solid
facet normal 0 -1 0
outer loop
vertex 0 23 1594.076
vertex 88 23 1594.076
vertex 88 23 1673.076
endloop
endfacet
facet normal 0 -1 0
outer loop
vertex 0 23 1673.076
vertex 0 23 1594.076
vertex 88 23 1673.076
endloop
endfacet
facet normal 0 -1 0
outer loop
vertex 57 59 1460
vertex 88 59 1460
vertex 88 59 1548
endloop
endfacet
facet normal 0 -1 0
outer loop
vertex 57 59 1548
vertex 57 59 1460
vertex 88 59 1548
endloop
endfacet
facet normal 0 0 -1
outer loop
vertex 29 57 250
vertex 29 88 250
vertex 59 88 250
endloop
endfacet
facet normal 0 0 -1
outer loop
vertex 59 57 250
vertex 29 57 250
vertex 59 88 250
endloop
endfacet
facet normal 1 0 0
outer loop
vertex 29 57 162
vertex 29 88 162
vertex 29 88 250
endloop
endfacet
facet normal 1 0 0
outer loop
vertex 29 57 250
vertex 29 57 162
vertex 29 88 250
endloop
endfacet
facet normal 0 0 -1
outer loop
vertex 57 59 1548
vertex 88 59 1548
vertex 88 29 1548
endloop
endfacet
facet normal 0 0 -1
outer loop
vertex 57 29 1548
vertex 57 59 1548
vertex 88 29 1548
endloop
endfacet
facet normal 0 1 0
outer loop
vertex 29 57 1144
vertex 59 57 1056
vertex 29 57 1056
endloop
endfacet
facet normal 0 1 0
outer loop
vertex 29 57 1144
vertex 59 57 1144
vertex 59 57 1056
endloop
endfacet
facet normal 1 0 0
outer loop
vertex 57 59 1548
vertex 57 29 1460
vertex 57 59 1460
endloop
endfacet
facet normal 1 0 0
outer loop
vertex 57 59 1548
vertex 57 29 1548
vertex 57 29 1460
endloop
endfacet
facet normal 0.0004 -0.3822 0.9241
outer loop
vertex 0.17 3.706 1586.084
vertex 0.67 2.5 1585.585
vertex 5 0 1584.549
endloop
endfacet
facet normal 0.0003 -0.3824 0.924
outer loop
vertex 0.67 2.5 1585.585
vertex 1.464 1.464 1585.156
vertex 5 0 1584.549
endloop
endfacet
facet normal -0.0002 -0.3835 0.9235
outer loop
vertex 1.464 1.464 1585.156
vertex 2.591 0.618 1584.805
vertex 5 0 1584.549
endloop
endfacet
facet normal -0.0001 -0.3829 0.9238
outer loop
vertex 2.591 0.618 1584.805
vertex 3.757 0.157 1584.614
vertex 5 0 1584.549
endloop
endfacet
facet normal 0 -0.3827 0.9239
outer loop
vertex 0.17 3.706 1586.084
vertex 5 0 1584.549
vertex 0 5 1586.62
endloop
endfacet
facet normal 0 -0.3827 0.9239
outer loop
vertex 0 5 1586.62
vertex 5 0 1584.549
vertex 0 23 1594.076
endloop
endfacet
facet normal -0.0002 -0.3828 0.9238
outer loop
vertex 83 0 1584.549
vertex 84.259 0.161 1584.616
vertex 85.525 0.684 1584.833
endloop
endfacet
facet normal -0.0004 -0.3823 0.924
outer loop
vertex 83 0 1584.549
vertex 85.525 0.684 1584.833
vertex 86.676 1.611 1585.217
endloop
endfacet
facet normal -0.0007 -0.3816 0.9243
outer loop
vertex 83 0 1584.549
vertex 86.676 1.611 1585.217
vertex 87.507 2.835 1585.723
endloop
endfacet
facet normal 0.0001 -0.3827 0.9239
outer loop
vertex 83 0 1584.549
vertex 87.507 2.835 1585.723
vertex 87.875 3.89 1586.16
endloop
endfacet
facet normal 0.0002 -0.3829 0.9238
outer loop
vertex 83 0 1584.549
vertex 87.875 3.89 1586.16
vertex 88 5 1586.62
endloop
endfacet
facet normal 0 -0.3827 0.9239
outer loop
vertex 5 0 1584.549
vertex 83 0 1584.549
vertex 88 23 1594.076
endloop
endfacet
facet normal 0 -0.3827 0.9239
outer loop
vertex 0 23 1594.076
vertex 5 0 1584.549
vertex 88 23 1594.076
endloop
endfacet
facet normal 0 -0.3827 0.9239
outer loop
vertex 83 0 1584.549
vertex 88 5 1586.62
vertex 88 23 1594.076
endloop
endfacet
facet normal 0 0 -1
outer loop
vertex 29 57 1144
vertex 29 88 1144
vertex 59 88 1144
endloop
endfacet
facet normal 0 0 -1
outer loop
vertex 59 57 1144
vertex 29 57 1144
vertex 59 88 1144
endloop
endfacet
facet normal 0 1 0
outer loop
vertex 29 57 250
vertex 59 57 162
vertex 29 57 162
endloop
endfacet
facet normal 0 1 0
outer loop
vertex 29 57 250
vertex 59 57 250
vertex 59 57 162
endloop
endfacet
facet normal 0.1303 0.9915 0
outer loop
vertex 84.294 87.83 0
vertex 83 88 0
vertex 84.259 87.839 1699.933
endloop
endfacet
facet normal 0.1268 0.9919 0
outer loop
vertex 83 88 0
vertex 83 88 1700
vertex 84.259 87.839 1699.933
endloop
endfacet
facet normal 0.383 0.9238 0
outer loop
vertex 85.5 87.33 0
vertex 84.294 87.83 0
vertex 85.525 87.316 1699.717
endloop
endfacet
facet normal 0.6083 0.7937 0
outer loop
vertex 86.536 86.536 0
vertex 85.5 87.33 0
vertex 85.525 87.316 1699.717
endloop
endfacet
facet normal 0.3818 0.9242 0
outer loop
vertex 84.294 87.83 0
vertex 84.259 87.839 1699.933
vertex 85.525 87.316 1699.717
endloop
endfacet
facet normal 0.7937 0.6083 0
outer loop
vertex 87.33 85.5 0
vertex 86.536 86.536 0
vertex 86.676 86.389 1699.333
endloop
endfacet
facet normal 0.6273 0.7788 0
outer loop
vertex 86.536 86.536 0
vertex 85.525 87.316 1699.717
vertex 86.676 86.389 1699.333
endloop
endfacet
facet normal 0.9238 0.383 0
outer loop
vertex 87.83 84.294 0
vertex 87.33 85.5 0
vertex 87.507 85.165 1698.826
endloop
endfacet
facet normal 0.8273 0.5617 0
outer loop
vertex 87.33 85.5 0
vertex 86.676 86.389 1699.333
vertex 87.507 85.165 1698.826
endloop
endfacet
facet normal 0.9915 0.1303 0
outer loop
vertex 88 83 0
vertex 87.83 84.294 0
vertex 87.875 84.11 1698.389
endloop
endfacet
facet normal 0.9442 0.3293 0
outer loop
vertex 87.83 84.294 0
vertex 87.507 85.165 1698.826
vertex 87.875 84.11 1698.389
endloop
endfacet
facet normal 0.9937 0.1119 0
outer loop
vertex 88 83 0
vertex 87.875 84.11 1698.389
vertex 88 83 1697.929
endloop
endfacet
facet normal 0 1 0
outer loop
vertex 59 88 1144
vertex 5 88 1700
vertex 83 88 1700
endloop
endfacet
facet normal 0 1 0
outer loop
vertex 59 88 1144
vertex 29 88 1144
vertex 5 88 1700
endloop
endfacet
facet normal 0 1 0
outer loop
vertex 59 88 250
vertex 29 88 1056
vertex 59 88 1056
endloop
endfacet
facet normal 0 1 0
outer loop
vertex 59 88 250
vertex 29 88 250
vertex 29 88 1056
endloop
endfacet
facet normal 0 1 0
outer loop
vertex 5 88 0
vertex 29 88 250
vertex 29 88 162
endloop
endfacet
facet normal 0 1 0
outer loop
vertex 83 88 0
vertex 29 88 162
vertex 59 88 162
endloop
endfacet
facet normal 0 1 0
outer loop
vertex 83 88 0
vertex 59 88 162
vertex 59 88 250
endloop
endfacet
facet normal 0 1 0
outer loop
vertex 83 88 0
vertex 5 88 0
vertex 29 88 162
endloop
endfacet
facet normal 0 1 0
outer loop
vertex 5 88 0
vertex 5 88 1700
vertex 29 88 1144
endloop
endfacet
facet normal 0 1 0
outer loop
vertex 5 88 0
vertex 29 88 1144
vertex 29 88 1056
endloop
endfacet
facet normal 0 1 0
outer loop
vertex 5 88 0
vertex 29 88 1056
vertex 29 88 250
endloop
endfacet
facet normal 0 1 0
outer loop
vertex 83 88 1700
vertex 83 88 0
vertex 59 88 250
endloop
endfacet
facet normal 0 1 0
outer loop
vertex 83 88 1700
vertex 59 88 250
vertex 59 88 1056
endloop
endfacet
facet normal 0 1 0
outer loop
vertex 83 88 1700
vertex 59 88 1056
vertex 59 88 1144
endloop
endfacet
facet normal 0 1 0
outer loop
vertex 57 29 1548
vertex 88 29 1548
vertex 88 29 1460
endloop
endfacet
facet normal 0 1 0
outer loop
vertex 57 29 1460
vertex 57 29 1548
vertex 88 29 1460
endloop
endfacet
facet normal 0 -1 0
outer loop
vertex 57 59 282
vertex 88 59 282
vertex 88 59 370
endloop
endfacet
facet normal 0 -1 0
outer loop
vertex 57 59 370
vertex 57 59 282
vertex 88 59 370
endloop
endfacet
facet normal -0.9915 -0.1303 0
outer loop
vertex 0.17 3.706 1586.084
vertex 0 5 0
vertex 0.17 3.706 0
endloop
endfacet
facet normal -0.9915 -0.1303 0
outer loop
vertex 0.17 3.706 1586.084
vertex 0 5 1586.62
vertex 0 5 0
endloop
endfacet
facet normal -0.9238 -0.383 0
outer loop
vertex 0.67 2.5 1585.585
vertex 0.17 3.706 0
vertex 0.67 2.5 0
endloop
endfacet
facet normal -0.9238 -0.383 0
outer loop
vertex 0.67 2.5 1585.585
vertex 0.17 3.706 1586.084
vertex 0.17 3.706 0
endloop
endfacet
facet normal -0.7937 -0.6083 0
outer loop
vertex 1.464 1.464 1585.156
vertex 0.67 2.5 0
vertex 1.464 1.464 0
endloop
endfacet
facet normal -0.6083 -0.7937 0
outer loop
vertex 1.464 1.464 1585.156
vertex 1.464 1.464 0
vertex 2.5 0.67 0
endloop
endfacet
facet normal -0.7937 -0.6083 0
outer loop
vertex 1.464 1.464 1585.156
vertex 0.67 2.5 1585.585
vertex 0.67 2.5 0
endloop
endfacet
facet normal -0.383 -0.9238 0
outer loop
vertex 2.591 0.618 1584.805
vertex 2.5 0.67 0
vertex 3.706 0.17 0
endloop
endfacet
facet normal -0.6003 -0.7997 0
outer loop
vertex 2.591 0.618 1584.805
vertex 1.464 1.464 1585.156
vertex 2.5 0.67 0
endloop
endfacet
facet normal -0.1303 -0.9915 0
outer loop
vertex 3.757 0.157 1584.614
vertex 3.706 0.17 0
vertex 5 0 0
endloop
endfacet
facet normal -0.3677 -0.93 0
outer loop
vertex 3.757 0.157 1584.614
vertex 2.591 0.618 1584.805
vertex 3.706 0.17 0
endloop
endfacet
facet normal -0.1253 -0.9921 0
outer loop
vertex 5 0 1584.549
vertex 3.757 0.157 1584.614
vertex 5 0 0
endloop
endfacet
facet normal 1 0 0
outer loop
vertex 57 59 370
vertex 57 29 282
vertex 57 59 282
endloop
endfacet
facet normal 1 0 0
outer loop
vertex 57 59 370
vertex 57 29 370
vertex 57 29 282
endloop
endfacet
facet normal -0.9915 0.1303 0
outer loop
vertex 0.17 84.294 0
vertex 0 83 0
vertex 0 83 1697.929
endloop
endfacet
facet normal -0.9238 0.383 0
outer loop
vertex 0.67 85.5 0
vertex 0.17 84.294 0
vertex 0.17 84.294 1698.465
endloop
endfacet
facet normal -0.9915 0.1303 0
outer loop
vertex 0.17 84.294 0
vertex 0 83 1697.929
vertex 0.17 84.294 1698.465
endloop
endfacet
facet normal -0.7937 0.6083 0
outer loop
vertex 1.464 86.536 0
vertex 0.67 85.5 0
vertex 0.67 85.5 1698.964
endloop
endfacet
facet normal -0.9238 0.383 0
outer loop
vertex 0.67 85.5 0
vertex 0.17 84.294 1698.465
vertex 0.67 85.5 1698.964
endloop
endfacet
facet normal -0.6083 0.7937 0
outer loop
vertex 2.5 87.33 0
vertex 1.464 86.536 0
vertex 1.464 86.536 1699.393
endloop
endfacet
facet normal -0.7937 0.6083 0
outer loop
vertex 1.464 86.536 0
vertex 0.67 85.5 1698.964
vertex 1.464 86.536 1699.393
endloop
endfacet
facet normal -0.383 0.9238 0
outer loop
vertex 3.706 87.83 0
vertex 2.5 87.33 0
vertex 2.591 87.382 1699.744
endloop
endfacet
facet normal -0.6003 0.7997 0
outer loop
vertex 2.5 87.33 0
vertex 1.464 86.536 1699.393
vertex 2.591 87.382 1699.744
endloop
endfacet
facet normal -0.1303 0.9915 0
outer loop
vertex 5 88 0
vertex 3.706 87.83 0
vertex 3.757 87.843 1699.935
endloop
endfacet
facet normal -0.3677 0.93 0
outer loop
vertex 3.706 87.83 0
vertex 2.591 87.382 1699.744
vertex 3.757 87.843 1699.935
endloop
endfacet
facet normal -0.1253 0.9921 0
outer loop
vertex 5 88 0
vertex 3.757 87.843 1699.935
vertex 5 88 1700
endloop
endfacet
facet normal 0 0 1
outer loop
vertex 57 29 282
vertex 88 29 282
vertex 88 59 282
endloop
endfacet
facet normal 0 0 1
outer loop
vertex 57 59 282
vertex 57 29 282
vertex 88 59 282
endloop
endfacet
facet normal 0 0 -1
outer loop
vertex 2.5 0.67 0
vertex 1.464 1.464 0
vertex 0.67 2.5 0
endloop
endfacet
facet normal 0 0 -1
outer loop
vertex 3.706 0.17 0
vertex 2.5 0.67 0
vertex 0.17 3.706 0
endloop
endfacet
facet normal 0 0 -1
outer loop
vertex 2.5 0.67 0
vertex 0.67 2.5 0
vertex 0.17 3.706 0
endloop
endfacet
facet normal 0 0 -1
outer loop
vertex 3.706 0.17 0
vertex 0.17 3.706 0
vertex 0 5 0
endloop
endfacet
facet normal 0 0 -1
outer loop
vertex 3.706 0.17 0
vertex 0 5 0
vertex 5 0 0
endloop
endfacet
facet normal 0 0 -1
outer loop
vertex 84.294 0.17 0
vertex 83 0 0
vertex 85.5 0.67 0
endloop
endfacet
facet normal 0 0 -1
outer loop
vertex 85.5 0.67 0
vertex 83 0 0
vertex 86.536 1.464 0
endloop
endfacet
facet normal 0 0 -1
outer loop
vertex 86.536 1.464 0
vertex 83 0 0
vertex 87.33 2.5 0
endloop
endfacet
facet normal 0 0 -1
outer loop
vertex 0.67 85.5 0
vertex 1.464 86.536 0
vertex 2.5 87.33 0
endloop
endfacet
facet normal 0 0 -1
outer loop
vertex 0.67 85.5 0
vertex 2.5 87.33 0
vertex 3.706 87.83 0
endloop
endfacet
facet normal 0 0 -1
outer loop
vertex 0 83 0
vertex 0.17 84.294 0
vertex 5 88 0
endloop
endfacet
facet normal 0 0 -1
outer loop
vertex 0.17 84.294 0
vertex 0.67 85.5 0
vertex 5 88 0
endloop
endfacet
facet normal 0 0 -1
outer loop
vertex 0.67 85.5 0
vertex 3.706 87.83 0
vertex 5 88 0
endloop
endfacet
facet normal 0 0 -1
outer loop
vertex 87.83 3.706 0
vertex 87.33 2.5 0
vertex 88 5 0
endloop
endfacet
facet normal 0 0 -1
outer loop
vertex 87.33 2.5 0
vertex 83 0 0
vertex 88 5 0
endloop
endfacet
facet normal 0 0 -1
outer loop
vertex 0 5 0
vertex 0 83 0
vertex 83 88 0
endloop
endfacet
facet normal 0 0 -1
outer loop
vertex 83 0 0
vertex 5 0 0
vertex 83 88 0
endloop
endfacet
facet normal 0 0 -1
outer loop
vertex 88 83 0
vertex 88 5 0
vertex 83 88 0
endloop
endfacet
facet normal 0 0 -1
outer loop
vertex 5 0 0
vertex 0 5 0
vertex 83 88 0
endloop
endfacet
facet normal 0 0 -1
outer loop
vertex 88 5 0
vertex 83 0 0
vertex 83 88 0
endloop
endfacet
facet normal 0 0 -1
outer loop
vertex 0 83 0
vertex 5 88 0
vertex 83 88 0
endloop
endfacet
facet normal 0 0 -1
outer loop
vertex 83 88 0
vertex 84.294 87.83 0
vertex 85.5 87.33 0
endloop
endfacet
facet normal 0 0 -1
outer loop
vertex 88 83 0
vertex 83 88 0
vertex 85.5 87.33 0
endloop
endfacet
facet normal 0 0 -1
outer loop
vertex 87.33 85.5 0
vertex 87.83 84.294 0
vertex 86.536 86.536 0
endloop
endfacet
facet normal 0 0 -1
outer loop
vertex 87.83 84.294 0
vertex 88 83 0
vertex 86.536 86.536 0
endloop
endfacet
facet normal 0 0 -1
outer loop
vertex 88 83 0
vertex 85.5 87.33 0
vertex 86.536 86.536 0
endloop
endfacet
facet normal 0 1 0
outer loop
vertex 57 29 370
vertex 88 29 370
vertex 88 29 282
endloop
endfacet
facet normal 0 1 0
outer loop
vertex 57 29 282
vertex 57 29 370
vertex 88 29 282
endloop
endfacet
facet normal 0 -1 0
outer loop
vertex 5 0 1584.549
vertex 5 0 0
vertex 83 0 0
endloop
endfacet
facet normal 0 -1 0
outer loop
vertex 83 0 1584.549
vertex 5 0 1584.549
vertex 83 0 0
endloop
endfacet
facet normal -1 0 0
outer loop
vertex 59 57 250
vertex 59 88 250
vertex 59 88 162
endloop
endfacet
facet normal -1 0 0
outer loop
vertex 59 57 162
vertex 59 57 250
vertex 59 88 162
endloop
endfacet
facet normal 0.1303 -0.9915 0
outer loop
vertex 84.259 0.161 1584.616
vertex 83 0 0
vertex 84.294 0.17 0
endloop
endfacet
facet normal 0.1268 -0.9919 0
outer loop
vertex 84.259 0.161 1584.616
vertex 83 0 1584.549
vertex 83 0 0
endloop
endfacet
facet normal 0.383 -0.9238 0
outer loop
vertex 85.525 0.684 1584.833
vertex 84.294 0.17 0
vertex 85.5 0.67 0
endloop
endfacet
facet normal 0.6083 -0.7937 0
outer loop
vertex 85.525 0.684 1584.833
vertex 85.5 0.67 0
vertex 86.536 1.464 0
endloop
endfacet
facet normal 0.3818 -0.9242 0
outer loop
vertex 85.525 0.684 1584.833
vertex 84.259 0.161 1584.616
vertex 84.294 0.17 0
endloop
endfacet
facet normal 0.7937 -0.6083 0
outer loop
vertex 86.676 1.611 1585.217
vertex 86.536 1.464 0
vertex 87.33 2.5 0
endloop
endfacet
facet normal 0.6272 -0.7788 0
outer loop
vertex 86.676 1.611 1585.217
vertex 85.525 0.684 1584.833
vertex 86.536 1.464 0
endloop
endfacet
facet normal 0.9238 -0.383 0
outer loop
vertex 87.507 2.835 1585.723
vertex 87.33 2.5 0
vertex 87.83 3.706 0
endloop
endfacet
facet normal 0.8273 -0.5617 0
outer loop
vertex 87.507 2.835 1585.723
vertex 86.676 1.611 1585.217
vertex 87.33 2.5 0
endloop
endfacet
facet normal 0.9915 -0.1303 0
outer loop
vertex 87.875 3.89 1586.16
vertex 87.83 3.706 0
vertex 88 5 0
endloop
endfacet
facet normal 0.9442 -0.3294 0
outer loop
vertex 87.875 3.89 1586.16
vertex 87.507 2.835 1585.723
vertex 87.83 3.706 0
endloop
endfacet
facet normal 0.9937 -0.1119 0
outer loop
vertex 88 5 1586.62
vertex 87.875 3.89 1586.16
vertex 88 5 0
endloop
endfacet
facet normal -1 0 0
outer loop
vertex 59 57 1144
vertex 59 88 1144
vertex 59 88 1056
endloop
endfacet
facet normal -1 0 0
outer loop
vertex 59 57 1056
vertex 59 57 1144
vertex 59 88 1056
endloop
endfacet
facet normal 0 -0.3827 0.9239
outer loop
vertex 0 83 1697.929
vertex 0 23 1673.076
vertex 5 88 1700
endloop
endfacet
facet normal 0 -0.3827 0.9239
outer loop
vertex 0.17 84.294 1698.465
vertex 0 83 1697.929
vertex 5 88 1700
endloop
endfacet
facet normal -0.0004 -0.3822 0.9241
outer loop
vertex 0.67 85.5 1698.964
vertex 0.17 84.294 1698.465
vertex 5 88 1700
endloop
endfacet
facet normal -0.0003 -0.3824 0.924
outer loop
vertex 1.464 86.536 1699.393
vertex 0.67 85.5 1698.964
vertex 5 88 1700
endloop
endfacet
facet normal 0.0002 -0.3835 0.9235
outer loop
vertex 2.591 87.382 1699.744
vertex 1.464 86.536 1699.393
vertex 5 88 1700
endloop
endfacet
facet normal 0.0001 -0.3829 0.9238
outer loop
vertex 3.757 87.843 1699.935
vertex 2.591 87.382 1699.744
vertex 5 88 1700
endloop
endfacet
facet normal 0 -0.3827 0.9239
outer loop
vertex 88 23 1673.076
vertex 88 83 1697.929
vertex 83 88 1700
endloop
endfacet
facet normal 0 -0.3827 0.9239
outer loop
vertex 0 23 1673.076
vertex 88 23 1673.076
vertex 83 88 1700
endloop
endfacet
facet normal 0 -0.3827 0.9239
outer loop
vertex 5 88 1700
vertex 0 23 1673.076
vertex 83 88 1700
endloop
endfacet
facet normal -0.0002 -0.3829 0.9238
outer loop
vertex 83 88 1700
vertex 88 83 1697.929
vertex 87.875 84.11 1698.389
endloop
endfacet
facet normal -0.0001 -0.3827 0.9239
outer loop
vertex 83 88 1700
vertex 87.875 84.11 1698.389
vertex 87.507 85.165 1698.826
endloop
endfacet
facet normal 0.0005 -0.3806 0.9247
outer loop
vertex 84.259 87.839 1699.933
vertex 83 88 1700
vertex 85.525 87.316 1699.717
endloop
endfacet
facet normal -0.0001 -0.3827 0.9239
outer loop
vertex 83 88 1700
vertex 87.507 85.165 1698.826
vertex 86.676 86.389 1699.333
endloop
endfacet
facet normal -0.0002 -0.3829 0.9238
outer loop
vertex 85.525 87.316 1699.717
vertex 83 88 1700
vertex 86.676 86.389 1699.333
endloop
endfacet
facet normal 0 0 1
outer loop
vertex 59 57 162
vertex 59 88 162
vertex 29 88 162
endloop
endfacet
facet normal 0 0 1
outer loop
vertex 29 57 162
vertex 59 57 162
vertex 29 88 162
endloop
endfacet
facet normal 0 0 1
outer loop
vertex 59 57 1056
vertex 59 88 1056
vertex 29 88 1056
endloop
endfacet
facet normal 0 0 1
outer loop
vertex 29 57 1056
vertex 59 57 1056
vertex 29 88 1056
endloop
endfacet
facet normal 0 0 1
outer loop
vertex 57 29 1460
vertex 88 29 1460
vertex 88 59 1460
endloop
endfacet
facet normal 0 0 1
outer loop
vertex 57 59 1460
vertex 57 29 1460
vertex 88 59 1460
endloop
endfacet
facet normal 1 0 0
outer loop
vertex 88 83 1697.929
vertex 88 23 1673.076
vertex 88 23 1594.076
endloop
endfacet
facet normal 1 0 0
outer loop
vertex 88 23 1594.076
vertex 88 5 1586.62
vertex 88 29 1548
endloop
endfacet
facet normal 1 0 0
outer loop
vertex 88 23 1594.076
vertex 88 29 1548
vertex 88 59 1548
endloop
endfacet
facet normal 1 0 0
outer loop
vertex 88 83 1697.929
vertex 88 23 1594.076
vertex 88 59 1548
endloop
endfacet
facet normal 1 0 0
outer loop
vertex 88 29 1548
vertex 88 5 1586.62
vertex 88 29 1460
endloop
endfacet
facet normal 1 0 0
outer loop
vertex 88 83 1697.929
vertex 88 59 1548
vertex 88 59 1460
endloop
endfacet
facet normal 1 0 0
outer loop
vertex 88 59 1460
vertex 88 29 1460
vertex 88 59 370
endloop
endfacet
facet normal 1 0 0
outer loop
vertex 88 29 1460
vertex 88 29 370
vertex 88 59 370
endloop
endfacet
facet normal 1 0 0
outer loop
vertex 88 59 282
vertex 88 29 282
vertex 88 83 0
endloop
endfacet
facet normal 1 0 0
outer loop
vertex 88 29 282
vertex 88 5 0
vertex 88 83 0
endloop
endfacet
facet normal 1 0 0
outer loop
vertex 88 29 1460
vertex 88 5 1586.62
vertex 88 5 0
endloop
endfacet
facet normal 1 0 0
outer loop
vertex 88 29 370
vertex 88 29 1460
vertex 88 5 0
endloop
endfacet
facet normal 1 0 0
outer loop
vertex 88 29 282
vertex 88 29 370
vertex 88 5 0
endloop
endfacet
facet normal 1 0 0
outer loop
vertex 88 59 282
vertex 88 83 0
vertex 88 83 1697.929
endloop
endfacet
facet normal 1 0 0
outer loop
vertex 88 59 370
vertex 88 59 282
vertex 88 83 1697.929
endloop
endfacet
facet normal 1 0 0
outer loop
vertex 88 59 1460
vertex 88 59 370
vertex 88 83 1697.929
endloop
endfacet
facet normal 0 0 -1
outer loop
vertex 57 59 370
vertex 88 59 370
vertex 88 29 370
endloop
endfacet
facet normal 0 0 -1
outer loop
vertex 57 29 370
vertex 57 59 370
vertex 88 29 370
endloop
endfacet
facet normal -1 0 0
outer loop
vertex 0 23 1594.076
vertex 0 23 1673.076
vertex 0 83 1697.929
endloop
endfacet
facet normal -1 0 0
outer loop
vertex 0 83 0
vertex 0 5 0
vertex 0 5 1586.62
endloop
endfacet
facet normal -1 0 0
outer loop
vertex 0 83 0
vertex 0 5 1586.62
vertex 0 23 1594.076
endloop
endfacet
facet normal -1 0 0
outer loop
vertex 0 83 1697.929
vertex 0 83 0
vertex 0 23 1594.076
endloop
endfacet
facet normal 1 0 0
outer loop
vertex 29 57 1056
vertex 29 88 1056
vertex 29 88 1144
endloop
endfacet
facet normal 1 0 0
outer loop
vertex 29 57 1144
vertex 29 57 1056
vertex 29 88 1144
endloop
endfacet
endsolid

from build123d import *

# Parameters (mm, degrees)
F0_W      = 88
F0_H      = 88
F1_DEPTH  = 1700
F3_DEPTH  = 31
F5_DEPTH  = 31
F7_DEPTH  = 88.001
F9_DEPTH  = 88.001
F11_DEPTH = 31
F13_DEPTH = 31
F14_R     = 5


with BuildPart() as f1:
    # F0 (on Top) → F1 (new body)
    with BuildSketch(Plane.XY):
        with Locations((44, 44)):
            Rectangle(F0_W, F0_H)
    extrude(amount=F1_DEPTH)

    # F2 (on face) → F3 (cut)
    with BuildSketch(Plane.YZ.offset(88)):
        Polygon((29, 282), (44, 282), (59, 282), (59, 370), (29, 370), align=None)
    extrude(amount=-F3_DEPTH, mode=Mode.SUBTRACT)

    # F4 (on face) → F5 (cut)
    with BuildSketch(Plane.YZ.offset(88)):
        Polygon((29, 1460), (44, 1460), (59, 1460), (59, 1548), (29, 1548), align=None)
    extrude(amount=-F5_DEPTH, mode=Mode.SUBTRACT)

    # F6 (on face) → F7 (cut, through all)
    with BuildSketch(Plane.YZ.offset(88)):
        Polygon((0, 1663.5492065112), (88, 1700), (0, 1700), align=None)
    extrude(amount=-F7_DEPTH, mode=Mode.SUBTRACT)

    # F8 (on face) → F9 (cut, through all)
    with BuildSketch(Plane.YZ.offset(88)):
        Polygon((23, 1594.0761184457), (23, 1673.0761184457), (0, 1663.5492065112), (0, 1584.5492065112), align=None)
    extrude(amount=-F9_DEPTH, mode=Mode.SUBTRACT)

    # F10 (on face) → F11 (cut)
    with BuildSketch(Plane(origin=(0, 88, 0), x_dir=(-1, 0, 0), z_dir=(0, 1, 0))):
        Polygon((-59, 162), (-44, 162), (-29, 162), (-29, 250), (-59, 250), align=None)
    extrude(amount=-F11_DEPTH, mode=Mode.SUBTRACT)

    # F12 (on face) → F13 (cut)
    with BuildSketch(Plane(origin=(0, 88, 0), x_dir=(-1, 0, 0), z_dir=(0, 1, 0))):
        Polygon((-59, 1056), (-44, 1056), (-29, 1056), (-29, 1144), (-59, 1144), align=None)
    extrude(amount=-F13_DEPTH, mode=Mode.SUBTRACT)

    # F14
    f14_edges = [f1.edges().sort_by_distance(p)[0] for p in [
        (88, 0, 792.274603),
        (0, 0, 792.274603),
        (88, 88, 850),
        (0, 88, 850),
    ]]
    fillet(f14_edges, radius=F14_R)


solid = f1.part
